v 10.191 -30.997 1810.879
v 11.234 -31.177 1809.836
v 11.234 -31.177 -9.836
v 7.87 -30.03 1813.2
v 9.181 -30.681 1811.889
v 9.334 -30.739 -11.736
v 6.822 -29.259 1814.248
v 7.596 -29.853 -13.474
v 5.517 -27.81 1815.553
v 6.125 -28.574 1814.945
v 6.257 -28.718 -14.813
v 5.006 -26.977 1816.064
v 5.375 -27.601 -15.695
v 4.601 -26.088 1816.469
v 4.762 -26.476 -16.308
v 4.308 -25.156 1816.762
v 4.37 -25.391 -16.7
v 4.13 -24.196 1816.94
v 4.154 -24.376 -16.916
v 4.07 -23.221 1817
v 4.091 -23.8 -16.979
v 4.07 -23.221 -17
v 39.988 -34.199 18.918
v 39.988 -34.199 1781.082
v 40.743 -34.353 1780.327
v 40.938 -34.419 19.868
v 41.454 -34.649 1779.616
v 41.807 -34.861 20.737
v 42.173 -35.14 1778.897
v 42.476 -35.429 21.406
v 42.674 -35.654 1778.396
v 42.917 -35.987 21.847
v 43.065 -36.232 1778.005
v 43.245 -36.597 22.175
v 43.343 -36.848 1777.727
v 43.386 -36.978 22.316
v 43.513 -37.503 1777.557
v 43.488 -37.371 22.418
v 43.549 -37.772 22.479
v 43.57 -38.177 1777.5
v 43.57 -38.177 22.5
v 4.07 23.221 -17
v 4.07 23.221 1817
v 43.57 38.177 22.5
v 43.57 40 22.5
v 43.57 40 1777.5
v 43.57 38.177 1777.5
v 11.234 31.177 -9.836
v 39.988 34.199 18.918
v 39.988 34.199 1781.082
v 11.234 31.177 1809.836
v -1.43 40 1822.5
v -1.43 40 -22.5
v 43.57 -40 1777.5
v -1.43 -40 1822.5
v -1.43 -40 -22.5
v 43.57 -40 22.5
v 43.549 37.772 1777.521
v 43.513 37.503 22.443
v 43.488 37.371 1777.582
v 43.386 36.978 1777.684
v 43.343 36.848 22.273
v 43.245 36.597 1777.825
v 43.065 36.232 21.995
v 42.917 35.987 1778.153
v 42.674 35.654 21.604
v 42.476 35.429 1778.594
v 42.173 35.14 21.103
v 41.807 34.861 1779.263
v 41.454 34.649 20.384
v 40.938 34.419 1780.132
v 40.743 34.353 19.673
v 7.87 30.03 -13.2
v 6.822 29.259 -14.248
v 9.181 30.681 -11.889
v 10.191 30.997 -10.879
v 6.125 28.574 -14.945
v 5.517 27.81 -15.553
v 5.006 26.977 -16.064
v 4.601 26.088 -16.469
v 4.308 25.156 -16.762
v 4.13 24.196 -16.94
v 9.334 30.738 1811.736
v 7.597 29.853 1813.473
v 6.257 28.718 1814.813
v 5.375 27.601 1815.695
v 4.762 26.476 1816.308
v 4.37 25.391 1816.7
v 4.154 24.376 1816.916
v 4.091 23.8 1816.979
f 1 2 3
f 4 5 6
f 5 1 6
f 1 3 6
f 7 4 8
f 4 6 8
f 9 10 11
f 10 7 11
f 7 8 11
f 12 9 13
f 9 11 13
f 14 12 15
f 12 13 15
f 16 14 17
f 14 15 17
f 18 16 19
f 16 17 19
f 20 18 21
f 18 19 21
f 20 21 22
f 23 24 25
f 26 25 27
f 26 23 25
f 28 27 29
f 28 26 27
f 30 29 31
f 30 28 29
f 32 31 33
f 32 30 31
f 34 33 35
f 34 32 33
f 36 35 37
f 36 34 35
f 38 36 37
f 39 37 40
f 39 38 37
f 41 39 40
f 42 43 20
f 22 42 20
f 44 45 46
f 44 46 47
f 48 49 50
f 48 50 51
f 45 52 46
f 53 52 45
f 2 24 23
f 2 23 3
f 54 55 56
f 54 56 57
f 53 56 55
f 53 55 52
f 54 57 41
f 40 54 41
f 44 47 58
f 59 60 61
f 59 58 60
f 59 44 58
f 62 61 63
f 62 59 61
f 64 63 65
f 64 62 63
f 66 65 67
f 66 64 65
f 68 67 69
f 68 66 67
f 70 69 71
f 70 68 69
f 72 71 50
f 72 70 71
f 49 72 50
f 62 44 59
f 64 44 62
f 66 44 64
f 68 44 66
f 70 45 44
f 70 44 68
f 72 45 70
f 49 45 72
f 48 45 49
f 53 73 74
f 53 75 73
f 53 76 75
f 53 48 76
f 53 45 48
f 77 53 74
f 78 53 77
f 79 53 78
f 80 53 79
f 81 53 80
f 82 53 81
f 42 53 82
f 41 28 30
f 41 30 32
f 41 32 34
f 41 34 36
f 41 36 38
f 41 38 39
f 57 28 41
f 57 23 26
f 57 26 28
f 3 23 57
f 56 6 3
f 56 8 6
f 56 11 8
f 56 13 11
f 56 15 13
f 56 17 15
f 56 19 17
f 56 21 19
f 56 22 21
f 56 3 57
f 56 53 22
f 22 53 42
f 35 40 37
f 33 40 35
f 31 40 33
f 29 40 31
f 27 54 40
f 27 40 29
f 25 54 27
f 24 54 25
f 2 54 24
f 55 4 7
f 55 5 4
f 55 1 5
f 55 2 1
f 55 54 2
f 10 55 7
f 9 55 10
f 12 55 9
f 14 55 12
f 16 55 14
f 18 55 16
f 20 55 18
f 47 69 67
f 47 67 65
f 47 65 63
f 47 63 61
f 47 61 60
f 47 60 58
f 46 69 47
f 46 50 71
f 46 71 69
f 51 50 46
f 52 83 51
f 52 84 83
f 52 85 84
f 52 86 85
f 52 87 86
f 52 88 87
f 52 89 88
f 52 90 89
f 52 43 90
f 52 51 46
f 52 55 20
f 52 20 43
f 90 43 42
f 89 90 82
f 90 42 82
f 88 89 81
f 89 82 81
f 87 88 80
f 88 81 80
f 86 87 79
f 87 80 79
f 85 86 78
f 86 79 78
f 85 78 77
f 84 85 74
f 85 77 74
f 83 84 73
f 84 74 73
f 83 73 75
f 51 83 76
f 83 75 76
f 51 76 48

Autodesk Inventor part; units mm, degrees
ref_plane "Начальная плоскость" through (0, 0, -22.5) normal (0, 0, 1) x (1, 0, 0)
ref_plane "Конечная плоскость" through (0, 0, 1822.5) normal (0, 0, 1) x (1, 0, 0)
sketch "Эскиз" plane through (0, 0, 0) normal (0, 0, 1) x (1, 0, 0)
  line L0 (-1.43, 0) -> (-1.43, 40)
  line L1 (-1.43, 40) -> (43.57, 40)
  line L2 (43.57, 40) -> (43.57, 38.1774)
  line L3 (39.9881, 34.1993) -> (11.2338, 31.1771)
  line L4 (4.07, 23.221) -> (4.07, 0)
  line L5 (4.07, 0) -> (-1.43, 0) construction
  line L6 (23.82, 40) -> (23.82, 32.5) construction
  line L7 (43.57, 34.5758) -> (43.57, 32.5) construction
  line L8 (43.57, 32.5) -> (23.82, 32.5) construction
  line L9 (0, 15) -> (0, -27) construction
  line L10 (-5.539, 0) -> (16.0067, 0) construction
  line L11 (-1.43, 0) -> (-1.43, -40)
  line L12 (-1.43, -40) -> (43.57, -40)
  line L13 (43.57, -40) -> (43.57, -38.1774)
  line L14 (39.9881, -34.1993) -> (11.2338, -31.1771)
  line L15 (4.07, -23.221) -> (4.07, 0)
  arc A0 (11.2338, 31.1771) -> (4.07, 23.221) centre (12.07, 23.221) ccw
  arc A1 (4.07, -23.221) -> (11.2338, -31.1771) centre (12.07, -23.221) ccw
  arc A2 (39.9881, 34.1993) -> (43.57, 38.1774) centre (39.57, 38.1774) ccw
  arc A3 (43.57, -38.1774) -> (39.9881, -34.1993) centre (39.57, -38.1774) ccw
  line L16 (0, 56) -> (0, -56) construction
  line L17 (-15.5135, 0) -> (54.308, 0) construction
  point P0 (4.07, 30.4242)
  point P1 (43.57, -34.5758)
  point P2 (4.07, -30.4242)
  point P3 (23.82, -40)
  point P4 (23.82, -32.5)
  dimension "d0" = 5.5
  dimension "d1" = 40
  dimension "d2" = 45
  dimension "d3" = 7.5
  dimension "d4" = 19.75
  dimension "d5" = 2.0758
  dimension "d23" = 8
  dimension "d24" = 4
  dimension "d25" = 1.43
extrude "Тело" add sketch "Эскиз" along normal up to surface (1845 mm away) from surface at -22.5
sketch "Sketch3" plane through (0, 0, 0) normal (0, 0, 1) x (1, 0, 0)
  line L0 (0, 0) -> (10, 0)
ref_plane "Work Plane3" through (0, 0, 0) normal (0, -1, 0) x (1, 0, 0)
sketch "Sketch4" plane through (0, 0, 0) normal (0, -1, 0) x (1, 0, 0)
  line L0 (-2, -22.5) -> (12, -22.5)
  line L1 (-2, 1822.5) -> (12, 1822.5)
  dimension "d29" = 1845
ref_plane "РабПлоскость4" through (-1.43, 0, 1822.5) normal (0.7071, 0, 0.7071) x (0.7071, 0, -0.7071)
split "Разделение1" plane through (-1.43, 0, 1822.5) removes the side toward (0.7071, 0, 0.7071)
ref_plane "РабПлоскость5" through (-1.43, 0, -22.5) normal (0.7071, 0, -0.7071) x (-0.7071, 0, -0.7071)
split "Разделение2" plane through (-1.43, 0, -22.5) removes the side toward (0.7071, 0, -0.7071)
equation "\"d0\" = G_T"
equation "\"d1\" = 0.5 * G_H"
equation "\"d2\" = G_W"
equation "\"d3\" = G_T1"
equation "\"d4\" = G_C"
equation "\"d23\" = G_IR"
equation "\"d24\" = G_ER"
equation "\"d25\" = ex"
equation "\"d6\" = G_L"
equation "\"G_W\" = 45"
equation "\"G_T\" = 5.5"
equation "\"G_T1\" = 7.5"
equation "\"G_NG\" = 0.105104"
equation "\"G_ER\" = 4"
equation "\"G_IR\" = 8"
equation "\"G_C\" = 19.75"
equation "\"G_L\" = d29"
equation "\"ex\" = 1.43"
equation "\"G_OFFSET_START\" = 22.5"
equation "\"G_OFFSET_END\" = 22.5"
equation "\"d26\" = -G_OFFSET_START"
equation "\"d27\" = G_OFFSET_END + B_L"
equation "\"G_H\" = 80"
equation "\"B_L\" = 1800"
properties part number "ISO 657/11 - CH 80 x 8 - 1845" material "Сталь нержавеющая, 440C"
